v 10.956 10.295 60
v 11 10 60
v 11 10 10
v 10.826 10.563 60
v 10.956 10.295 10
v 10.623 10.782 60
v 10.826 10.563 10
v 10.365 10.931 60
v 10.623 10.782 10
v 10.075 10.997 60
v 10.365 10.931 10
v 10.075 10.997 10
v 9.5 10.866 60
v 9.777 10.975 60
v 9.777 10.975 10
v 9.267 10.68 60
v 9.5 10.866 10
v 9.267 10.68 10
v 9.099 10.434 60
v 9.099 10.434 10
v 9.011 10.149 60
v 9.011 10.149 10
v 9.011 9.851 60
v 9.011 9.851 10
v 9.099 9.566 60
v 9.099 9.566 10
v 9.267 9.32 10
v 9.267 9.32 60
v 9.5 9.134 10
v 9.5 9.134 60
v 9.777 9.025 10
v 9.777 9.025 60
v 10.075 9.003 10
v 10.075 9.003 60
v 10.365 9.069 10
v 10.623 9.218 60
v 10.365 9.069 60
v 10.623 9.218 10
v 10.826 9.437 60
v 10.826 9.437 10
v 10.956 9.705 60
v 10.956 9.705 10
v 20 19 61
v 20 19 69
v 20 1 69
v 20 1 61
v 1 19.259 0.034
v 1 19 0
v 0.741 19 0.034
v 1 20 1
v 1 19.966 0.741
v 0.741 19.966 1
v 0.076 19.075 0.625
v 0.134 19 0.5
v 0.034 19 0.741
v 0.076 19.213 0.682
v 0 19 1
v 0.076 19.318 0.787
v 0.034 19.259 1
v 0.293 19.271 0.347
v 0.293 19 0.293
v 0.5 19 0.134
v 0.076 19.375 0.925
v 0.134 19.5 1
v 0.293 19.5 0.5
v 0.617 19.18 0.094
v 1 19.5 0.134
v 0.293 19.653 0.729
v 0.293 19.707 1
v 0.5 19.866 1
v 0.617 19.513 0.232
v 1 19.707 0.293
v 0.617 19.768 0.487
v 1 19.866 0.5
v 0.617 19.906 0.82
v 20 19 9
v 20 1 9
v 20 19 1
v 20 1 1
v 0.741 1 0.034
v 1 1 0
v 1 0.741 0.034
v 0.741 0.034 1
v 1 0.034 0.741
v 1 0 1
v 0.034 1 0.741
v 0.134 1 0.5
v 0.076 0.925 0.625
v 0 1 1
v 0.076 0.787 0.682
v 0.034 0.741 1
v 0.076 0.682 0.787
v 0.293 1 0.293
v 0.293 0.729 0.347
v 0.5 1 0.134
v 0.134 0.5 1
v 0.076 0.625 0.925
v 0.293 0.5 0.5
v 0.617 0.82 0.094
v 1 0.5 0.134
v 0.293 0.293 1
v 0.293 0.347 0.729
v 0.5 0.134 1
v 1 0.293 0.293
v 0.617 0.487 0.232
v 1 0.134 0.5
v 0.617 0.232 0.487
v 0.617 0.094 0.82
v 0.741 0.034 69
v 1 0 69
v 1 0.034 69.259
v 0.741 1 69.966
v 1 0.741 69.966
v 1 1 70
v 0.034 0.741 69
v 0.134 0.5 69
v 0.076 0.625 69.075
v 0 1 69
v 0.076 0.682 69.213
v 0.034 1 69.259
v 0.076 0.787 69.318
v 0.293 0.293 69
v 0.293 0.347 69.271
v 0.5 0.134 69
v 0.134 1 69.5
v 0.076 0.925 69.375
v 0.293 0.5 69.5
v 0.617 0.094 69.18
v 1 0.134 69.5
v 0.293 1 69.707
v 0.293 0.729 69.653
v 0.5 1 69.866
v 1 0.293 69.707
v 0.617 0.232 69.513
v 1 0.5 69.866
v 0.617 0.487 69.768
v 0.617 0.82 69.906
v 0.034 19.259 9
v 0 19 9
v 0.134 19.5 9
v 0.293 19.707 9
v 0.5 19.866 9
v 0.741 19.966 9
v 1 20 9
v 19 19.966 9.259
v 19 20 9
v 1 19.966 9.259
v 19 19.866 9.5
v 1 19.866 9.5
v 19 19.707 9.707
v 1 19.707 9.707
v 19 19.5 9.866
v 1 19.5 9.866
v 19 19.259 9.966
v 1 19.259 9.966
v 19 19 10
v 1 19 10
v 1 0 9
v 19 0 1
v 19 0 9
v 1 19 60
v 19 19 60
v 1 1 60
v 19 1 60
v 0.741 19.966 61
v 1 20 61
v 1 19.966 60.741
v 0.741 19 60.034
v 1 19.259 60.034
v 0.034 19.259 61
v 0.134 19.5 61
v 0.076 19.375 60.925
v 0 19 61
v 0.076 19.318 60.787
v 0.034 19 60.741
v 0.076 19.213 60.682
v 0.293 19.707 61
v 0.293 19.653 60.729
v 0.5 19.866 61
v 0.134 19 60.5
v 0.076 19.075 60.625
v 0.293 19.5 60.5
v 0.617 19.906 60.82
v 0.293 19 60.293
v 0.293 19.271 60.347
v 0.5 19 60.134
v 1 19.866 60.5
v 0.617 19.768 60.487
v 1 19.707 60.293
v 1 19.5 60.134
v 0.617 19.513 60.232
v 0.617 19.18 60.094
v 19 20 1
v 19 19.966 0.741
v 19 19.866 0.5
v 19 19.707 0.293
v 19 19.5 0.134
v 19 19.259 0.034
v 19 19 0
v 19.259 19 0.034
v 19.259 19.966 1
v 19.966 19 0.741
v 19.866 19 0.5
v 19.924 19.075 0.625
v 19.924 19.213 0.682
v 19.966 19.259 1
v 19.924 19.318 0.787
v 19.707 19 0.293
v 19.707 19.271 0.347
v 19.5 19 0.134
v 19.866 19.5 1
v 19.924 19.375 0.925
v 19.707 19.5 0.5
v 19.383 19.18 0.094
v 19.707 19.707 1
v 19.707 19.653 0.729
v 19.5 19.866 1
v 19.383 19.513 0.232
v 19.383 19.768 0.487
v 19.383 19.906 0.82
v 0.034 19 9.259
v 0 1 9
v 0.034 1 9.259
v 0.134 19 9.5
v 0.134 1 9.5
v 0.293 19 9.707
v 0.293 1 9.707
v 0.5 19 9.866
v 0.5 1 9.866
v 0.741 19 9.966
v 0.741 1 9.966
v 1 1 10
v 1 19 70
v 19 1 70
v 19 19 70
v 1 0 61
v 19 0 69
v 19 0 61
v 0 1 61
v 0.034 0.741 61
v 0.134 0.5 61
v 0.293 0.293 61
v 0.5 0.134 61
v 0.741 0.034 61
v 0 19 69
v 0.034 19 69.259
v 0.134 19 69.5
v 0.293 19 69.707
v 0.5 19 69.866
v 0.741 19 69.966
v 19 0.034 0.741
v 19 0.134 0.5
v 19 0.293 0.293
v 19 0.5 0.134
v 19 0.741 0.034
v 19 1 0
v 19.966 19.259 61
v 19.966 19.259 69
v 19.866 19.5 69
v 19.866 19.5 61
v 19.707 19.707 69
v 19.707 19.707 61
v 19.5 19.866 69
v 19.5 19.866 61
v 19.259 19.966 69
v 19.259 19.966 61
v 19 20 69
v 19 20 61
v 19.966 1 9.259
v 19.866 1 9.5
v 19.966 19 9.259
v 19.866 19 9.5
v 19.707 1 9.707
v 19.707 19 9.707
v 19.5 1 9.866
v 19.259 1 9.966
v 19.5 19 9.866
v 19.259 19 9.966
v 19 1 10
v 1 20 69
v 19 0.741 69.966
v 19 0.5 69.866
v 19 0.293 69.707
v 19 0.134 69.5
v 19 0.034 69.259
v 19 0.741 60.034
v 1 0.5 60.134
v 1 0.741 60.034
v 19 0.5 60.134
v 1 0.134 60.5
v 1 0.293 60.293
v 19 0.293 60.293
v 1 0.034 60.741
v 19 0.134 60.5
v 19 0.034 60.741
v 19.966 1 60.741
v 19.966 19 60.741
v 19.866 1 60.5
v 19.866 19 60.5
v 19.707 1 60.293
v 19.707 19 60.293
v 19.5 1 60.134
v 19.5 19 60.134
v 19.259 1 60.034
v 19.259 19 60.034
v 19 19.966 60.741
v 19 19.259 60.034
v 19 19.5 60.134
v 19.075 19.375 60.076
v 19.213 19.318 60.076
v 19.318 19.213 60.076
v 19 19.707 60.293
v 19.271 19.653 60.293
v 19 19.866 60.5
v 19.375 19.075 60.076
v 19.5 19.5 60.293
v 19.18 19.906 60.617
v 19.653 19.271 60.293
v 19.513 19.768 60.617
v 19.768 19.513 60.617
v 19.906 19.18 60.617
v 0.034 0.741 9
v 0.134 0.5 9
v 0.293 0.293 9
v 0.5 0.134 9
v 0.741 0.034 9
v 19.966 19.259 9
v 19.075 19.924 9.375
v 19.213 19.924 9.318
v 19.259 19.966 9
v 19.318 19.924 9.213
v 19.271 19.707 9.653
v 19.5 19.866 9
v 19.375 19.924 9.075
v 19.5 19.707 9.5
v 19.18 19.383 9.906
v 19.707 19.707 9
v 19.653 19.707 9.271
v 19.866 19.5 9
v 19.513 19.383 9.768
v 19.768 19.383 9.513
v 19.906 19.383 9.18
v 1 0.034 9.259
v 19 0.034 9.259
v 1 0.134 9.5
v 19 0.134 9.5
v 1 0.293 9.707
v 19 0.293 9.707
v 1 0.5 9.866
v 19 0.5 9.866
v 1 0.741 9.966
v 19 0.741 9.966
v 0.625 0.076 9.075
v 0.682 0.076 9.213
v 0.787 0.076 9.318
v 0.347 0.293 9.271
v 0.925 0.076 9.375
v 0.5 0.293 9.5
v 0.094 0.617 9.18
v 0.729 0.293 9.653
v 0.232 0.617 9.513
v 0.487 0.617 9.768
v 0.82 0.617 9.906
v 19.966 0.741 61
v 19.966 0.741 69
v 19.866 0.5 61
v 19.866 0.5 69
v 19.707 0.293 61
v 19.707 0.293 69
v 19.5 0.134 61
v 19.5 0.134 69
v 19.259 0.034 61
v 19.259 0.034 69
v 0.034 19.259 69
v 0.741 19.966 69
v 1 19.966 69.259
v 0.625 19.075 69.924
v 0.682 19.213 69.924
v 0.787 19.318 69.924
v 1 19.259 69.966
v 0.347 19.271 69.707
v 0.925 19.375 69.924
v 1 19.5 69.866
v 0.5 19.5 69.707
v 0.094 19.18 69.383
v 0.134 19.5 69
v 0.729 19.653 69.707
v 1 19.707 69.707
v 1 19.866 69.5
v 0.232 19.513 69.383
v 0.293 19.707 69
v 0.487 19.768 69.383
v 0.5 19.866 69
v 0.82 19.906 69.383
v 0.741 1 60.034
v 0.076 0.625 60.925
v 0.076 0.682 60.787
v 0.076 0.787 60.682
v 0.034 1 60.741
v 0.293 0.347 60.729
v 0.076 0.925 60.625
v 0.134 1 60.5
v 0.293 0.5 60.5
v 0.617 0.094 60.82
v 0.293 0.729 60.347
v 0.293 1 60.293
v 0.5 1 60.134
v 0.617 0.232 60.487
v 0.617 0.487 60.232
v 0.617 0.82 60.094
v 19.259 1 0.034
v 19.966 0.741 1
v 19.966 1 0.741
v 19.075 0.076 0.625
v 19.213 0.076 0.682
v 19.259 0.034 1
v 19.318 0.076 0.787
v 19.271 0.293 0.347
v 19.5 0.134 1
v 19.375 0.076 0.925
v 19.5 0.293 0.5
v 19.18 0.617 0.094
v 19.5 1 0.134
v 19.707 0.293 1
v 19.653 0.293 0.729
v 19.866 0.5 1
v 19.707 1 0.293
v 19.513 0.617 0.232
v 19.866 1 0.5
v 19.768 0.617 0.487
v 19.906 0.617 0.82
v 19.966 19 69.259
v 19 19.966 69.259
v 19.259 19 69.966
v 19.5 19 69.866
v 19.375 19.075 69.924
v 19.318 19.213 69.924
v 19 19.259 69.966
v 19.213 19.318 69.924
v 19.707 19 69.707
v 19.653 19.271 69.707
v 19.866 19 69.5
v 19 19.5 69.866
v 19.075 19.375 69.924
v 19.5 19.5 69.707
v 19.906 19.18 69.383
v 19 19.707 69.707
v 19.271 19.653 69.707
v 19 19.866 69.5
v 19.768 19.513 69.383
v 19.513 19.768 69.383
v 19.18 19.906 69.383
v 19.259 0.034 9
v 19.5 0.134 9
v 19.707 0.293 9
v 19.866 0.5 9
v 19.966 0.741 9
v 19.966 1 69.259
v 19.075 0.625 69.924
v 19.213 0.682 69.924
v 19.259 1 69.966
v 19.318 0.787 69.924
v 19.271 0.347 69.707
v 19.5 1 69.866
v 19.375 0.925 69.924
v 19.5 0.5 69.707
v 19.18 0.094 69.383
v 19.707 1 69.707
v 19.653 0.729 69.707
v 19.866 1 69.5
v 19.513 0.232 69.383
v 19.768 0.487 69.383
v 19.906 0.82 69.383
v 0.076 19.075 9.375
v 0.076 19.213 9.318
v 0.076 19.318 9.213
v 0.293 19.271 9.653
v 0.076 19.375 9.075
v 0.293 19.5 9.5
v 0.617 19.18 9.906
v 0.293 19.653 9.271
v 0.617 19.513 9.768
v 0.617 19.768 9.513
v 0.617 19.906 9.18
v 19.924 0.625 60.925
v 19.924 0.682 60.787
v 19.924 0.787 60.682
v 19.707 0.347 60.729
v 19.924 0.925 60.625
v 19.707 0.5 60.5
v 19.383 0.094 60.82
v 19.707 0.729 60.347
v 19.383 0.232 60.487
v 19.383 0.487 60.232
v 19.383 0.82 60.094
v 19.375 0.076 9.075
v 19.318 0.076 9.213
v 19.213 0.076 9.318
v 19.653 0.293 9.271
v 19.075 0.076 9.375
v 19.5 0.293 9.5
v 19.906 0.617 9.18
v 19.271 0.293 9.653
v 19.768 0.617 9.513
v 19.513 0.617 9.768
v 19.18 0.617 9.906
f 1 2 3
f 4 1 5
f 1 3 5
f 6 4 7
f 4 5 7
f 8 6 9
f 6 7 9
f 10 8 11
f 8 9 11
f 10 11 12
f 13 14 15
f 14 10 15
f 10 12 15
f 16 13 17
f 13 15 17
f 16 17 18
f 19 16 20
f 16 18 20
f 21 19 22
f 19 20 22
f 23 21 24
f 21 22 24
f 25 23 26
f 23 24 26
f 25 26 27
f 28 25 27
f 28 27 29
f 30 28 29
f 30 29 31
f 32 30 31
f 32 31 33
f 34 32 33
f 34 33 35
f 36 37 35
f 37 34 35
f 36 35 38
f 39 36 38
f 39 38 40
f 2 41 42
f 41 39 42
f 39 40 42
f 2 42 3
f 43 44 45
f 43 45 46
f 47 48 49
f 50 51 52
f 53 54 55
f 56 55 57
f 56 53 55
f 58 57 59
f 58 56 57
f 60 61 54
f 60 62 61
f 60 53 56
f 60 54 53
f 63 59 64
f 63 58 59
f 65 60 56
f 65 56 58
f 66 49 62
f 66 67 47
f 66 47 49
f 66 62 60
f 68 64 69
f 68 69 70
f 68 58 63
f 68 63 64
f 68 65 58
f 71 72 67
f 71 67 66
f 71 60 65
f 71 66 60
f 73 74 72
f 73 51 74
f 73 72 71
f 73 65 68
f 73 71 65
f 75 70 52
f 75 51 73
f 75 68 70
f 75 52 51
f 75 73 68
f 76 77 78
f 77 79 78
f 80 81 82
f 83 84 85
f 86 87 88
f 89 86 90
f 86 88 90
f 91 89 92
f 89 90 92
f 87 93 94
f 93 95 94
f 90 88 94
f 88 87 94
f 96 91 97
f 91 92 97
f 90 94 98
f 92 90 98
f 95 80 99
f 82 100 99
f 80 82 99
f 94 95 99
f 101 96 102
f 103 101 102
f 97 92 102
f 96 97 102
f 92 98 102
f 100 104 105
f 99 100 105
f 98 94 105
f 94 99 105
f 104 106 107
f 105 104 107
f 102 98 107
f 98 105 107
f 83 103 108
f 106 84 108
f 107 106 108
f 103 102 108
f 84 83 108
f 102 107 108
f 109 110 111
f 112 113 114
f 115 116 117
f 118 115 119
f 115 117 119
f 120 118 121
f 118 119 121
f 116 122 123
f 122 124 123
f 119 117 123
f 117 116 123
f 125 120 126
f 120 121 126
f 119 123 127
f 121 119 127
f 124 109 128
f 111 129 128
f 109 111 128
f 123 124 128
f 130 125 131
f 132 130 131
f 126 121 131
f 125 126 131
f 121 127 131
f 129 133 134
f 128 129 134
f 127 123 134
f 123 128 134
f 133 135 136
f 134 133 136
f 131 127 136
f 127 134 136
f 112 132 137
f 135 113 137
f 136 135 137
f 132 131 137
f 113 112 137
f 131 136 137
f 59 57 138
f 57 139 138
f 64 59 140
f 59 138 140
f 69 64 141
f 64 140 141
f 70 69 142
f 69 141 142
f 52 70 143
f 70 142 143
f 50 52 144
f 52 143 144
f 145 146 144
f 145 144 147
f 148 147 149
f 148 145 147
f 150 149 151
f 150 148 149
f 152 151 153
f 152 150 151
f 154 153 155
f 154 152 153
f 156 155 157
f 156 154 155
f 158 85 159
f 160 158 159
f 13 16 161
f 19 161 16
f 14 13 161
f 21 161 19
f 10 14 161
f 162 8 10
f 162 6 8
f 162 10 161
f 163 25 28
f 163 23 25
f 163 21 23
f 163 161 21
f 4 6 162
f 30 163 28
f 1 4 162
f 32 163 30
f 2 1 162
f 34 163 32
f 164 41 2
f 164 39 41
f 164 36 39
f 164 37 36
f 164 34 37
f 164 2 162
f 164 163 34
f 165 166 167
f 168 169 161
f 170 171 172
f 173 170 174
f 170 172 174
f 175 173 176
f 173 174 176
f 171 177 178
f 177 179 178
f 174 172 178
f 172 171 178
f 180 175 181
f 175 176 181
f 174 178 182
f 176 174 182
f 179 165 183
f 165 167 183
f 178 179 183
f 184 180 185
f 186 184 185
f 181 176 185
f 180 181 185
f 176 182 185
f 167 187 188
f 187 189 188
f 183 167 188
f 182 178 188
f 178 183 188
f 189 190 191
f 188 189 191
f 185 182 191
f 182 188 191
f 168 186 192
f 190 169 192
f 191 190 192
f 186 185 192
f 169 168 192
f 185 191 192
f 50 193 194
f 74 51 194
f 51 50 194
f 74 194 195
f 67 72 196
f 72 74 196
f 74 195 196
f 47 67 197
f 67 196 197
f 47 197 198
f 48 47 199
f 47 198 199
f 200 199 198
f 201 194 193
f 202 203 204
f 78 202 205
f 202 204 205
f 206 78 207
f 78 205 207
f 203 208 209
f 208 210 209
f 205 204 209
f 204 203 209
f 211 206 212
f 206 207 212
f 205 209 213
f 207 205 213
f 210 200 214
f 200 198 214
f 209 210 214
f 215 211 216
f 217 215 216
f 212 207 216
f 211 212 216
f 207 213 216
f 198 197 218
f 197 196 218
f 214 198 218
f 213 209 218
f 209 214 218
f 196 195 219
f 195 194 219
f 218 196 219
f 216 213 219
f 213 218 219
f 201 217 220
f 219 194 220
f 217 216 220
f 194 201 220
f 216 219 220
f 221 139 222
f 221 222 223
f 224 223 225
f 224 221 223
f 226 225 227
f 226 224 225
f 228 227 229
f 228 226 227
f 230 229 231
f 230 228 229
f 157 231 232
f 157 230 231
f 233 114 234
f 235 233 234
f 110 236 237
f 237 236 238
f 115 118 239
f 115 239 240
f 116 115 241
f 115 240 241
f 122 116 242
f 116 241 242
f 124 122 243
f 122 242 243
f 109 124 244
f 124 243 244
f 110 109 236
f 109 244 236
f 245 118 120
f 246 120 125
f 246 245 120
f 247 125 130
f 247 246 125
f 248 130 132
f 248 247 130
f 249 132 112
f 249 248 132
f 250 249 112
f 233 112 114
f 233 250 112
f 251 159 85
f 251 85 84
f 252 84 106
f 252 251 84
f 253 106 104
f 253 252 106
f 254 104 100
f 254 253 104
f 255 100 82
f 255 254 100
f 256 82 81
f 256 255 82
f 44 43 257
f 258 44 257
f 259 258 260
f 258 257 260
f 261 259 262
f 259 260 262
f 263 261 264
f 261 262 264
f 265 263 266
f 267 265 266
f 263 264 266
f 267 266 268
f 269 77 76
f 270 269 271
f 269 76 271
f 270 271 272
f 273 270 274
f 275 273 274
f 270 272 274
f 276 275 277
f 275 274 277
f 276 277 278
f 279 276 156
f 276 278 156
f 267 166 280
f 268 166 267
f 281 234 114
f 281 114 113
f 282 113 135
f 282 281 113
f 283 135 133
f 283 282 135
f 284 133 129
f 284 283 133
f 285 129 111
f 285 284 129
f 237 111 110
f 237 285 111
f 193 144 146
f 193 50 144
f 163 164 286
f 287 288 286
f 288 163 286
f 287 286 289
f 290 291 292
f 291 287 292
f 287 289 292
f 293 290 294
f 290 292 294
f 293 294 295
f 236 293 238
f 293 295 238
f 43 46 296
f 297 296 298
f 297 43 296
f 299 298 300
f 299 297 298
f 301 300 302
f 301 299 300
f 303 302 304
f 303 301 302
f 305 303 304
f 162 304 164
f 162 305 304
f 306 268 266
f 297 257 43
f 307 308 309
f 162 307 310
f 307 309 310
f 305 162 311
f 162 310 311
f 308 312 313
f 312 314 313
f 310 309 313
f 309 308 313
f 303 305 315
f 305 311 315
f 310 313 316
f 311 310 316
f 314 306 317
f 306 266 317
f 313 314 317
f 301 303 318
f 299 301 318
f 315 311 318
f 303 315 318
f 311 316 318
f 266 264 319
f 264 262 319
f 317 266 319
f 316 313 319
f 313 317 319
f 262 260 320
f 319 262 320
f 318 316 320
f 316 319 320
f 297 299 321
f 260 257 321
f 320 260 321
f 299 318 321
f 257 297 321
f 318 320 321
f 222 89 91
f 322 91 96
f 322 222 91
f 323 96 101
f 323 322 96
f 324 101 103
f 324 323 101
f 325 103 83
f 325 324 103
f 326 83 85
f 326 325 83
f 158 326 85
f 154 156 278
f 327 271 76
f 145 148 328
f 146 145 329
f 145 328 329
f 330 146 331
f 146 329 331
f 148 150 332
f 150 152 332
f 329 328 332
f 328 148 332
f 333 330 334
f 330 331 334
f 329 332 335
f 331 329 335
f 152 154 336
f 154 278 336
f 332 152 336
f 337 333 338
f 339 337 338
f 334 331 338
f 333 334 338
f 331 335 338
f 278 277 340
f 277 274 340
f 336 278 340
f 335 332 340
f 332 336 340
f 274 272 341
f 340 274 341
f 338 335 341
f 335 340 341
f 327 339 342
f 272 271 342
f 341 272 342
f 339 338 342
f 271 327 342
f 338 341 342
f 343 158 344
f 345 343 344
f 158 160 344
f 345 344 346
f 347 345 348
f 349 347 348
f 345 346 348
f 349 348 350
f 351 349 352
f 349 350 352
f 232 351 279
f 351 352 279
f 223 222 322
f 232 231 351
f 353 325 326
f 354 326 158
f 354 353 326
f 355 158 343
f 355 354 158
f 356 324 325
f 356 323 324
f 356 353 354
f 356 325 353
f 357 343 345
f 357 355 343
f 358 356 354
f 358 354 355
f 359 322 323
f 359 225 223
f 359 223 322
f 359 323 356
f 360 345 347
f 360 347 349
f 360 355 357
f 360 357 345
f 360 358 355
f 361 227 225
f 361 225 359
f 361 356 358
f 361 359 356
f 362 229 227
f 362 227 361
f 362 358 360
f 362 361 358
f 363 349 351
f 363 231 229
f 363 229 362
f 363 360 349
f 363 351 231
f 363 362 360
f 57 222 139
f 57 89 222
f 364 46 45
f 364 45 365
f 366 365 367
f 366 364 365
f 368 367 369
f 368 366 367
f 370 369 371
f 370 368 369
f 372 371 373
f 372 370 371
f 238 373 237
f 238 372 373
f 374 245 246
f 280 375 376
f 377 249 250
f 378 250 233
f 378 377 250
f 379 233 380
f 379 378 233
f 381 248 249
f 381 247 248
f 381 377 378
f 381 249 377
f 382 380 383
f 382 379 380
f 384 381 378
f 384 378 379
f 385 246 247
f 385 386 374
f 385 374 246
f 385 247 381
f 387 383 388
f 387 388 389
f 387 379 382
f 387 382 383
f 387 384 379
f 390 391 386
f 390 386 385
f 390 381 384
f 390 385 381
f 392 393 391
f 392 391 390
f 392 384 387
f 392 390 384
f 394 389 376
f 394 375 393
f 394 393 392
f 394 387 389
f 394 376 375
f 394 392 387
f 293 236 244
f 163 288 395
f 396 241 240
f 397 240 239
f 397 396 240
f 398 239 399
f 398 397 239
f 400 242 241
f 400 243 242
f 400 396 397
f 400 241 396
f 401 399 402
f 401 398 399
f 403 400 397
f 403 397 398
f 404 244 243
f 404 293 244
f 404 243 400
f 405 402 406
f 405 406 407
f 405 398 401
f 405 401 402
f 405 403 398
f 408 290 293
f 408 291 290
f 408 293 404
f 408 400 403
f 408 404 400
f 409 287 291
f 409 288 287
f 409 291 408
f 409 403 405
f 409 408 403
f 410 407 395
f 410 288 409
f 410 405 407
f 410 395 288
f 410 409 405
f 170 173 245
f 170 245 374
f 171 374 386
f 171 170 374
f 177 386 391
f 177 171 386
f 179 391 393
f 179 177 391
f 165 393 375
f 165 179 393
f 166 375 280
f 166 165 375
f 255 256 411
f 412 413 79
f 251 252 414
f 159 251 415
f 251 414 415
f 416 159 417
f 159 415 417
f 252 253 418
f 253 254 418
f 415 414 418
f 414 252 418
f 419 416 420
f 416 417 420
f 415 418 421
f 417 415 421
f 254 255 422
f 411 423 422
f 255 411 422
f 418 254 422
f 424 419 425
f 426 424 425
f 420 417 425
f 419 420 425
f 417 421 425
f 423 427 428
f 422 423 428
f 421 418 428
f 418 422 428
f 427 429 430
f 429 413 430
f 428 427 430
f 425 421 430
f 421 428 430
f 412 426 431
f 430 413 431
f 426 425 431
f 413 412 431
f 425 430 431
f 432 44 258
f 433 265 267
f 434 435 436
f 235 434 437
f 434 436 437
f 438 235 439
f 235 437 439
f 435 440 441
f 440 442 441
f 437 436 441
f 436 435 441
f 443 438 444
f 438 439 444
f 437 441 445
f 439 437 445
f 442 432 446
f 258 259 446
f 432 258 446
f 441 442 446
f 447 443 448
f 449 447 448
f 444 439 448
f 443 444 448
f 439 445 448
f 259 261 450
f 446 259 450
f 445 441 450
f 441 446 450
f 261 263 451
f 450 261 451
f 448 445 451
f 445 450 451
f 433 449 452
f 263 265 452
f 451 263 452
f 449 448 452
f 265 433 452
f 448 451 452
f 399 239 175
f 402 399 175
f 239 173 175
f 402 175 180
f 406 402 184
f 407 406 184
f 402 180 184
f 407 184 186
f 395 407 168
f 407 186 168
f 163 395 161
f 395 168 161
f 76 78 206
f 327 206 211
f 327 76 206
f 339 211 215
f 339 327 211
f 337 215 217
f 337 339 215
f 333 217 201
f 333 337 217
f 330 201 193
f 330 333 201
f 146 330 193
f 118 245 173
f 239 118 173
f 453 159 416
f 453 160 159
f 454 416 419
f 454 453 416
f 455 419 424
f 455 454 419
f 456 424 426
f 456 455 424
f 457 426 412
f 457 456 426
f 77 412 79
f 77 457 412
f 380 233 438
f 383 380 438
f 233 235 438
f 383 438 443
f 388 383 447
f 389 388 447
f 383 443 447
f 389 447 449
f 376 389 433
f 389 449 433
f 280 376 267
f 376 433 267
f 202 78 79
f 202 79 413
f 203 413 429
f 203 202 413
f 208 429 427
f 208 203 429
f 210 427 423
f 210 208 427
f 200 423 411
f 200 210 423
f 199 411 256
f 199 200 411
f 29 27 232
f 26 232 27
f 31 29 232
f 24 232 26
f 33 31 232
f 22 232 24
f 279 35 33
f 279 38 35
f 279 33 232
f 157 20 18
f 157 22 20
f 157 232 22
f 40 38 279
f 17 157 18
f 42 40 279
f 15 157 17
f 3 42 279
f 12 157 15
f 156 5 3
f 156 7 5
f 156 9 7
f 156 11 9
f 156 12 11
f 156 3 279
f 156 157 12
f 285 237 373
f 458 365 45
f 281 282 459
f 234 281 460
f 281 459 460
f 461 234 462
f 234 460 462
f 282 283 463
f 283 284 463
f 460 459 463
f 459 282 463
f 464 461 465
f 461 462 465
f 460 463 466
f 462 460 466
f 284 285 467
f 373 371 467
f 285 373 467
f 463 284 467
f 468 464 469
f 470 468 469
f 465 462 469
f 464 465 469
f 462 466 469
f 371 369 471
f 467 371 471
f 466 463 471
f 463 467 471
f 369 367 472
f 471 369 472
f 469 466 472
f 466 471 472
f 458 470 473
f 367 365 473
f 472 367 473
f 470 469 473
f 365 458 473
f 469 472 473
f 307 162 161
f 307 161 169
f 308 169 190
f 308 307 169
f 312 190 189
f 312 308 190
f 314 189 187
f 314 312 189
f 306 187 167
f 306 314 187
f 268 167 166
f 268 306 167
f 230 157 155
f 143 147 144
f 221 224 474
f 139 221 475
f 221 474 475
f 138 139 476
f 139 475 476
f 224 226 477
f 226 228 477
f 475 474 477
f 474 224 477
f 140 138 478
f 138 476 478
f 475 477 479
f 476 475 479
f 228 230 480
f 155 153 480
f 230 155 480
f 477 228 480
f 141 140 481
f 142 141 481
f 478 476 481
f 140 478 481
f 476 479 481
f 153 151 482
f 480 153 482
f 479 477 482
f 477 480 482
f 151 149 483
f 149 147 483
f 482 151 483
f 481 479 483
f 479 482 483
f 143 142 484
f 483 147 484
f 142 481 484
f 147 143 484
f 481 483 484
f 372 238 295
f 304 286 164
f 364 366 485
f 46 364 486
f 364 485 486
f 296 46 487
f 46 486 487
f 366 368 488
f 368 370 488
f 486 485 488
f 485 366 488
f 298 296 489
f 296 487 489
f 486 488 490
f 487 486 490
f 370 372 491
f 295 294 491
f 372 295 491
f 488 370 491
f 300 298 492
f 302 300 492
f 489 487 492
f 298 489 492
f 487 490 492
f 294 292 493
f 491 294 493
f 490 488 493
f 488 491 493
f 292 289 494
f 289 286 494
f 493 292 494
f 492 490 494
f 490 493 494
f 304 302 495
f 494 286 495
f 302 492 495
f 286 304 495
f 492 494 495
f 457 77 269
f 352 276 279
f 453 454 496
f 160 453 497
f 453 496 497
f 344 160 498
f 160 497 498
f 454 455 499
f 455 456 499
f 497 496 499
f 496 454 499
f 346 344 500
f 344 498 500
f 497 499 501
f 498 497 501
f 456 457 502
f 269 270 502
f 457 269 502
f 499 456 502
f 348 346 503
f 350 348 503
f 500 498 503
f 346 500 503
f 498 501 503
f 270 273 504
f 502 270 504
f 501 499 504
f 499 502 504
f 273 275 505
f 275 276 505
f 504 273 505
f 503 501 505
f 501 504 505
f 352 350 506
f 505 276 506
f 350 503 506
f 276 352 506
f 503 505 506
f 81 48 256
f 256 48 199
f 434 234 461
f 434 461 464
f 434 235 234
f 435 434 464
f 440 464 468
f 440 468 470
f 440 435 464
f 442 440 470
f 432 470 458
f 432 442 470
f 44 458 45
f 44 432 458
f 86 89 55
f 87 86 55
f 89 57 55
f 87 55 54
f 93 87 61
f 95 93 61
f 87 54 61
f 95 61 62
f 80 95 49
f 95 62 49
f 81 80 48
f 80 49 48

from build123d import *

# Parameters (mm, degrees)
SKETCH1_W           = 20
SKETCH1_H           = 20
BOSS_EXTRUDE1_DEPTH = 10
SKETCH4_W           = 20
SKETCH4_H           = 10
BOSS_EXTRUDE2_DEPTH = 20
FILLET6_R           = 1
FILLET7_R           = 1
SKETCH6_R           = 1
BOSS_EXTRUDE3_DEPTH = 60


with BuildPart() as part:
    # Sketch1 → Boss-Extrude1 (new body)
    with BuildSketch(Plane.XY):
        with Locations((10, 10)):
            Rectangle(SKETCH1_W, SKETCH1_H)
    extrude(amount=BOSS_EXTRUDE1_DEPTH)

    # Fillet6
    fillet6_edges = [part.edges().sort_by_distance(p)[0] for p in [
        (20, 10, 10),
        (10, 20, 10),
        (0, 10, 10),
        (10, 20, 0),
        (20, 10, 0),
        (10, 0, 0),
        (0, 10, 0),
        (0, 20, 5),
        (20, 20, 5),
        (20, 0, 5),
        (0, 0, 5),
        (10, 0, 10),
    ]]
    fillet(fillet6_edges, radius=FILLET6_R)



with BuildPart() as body_2:
    # Sketch4 → Boss-Extrude2 (new body)
    with BuildSketch(Plane(origin=(0, 0, 0), x_dir=(1, 0, 0), z_dir=(0, 1, 0))):
        with Locations((10, -65)):
            Rectangle(SKETCH4_W, SKETCH4_H)
    extrude(amount=BOSS_EXTRUDE2_DEPTH)

    # Fillet7
    fillet7_edges = [body_2.edges().sort_by_distance(p)[0] for p in [
        (20, 20, 65),
        (10, 20, 60),
        (0, 20, 65),
        (10, 0, 60),
        (20, 0, 65),
        (10, 0, 70),
        (0, 0, 65),
        (0, 10, 60),
        (20, 10, 60),
        (20, 10, 70),
        (0, 10, 70),
        (10, 20, 70),
    ]]
    fillet(fillet7_edges, radius=FILLET7_R)


with BuildPart() as part_1:
    add(part.part)

    add(body_2.part)  # Boss-Extrude3 merges body 2
    # Sketch6 → Boss-Extrude3 (add)
    with BuildSketch(Plane.XY.offset(10)):
        with Locations((10, 10)):
            Circle(SKETCH6_R)
    extrude(amount=BOSS_EXTRUDE3_DEPTH)


solid = part_1.part
